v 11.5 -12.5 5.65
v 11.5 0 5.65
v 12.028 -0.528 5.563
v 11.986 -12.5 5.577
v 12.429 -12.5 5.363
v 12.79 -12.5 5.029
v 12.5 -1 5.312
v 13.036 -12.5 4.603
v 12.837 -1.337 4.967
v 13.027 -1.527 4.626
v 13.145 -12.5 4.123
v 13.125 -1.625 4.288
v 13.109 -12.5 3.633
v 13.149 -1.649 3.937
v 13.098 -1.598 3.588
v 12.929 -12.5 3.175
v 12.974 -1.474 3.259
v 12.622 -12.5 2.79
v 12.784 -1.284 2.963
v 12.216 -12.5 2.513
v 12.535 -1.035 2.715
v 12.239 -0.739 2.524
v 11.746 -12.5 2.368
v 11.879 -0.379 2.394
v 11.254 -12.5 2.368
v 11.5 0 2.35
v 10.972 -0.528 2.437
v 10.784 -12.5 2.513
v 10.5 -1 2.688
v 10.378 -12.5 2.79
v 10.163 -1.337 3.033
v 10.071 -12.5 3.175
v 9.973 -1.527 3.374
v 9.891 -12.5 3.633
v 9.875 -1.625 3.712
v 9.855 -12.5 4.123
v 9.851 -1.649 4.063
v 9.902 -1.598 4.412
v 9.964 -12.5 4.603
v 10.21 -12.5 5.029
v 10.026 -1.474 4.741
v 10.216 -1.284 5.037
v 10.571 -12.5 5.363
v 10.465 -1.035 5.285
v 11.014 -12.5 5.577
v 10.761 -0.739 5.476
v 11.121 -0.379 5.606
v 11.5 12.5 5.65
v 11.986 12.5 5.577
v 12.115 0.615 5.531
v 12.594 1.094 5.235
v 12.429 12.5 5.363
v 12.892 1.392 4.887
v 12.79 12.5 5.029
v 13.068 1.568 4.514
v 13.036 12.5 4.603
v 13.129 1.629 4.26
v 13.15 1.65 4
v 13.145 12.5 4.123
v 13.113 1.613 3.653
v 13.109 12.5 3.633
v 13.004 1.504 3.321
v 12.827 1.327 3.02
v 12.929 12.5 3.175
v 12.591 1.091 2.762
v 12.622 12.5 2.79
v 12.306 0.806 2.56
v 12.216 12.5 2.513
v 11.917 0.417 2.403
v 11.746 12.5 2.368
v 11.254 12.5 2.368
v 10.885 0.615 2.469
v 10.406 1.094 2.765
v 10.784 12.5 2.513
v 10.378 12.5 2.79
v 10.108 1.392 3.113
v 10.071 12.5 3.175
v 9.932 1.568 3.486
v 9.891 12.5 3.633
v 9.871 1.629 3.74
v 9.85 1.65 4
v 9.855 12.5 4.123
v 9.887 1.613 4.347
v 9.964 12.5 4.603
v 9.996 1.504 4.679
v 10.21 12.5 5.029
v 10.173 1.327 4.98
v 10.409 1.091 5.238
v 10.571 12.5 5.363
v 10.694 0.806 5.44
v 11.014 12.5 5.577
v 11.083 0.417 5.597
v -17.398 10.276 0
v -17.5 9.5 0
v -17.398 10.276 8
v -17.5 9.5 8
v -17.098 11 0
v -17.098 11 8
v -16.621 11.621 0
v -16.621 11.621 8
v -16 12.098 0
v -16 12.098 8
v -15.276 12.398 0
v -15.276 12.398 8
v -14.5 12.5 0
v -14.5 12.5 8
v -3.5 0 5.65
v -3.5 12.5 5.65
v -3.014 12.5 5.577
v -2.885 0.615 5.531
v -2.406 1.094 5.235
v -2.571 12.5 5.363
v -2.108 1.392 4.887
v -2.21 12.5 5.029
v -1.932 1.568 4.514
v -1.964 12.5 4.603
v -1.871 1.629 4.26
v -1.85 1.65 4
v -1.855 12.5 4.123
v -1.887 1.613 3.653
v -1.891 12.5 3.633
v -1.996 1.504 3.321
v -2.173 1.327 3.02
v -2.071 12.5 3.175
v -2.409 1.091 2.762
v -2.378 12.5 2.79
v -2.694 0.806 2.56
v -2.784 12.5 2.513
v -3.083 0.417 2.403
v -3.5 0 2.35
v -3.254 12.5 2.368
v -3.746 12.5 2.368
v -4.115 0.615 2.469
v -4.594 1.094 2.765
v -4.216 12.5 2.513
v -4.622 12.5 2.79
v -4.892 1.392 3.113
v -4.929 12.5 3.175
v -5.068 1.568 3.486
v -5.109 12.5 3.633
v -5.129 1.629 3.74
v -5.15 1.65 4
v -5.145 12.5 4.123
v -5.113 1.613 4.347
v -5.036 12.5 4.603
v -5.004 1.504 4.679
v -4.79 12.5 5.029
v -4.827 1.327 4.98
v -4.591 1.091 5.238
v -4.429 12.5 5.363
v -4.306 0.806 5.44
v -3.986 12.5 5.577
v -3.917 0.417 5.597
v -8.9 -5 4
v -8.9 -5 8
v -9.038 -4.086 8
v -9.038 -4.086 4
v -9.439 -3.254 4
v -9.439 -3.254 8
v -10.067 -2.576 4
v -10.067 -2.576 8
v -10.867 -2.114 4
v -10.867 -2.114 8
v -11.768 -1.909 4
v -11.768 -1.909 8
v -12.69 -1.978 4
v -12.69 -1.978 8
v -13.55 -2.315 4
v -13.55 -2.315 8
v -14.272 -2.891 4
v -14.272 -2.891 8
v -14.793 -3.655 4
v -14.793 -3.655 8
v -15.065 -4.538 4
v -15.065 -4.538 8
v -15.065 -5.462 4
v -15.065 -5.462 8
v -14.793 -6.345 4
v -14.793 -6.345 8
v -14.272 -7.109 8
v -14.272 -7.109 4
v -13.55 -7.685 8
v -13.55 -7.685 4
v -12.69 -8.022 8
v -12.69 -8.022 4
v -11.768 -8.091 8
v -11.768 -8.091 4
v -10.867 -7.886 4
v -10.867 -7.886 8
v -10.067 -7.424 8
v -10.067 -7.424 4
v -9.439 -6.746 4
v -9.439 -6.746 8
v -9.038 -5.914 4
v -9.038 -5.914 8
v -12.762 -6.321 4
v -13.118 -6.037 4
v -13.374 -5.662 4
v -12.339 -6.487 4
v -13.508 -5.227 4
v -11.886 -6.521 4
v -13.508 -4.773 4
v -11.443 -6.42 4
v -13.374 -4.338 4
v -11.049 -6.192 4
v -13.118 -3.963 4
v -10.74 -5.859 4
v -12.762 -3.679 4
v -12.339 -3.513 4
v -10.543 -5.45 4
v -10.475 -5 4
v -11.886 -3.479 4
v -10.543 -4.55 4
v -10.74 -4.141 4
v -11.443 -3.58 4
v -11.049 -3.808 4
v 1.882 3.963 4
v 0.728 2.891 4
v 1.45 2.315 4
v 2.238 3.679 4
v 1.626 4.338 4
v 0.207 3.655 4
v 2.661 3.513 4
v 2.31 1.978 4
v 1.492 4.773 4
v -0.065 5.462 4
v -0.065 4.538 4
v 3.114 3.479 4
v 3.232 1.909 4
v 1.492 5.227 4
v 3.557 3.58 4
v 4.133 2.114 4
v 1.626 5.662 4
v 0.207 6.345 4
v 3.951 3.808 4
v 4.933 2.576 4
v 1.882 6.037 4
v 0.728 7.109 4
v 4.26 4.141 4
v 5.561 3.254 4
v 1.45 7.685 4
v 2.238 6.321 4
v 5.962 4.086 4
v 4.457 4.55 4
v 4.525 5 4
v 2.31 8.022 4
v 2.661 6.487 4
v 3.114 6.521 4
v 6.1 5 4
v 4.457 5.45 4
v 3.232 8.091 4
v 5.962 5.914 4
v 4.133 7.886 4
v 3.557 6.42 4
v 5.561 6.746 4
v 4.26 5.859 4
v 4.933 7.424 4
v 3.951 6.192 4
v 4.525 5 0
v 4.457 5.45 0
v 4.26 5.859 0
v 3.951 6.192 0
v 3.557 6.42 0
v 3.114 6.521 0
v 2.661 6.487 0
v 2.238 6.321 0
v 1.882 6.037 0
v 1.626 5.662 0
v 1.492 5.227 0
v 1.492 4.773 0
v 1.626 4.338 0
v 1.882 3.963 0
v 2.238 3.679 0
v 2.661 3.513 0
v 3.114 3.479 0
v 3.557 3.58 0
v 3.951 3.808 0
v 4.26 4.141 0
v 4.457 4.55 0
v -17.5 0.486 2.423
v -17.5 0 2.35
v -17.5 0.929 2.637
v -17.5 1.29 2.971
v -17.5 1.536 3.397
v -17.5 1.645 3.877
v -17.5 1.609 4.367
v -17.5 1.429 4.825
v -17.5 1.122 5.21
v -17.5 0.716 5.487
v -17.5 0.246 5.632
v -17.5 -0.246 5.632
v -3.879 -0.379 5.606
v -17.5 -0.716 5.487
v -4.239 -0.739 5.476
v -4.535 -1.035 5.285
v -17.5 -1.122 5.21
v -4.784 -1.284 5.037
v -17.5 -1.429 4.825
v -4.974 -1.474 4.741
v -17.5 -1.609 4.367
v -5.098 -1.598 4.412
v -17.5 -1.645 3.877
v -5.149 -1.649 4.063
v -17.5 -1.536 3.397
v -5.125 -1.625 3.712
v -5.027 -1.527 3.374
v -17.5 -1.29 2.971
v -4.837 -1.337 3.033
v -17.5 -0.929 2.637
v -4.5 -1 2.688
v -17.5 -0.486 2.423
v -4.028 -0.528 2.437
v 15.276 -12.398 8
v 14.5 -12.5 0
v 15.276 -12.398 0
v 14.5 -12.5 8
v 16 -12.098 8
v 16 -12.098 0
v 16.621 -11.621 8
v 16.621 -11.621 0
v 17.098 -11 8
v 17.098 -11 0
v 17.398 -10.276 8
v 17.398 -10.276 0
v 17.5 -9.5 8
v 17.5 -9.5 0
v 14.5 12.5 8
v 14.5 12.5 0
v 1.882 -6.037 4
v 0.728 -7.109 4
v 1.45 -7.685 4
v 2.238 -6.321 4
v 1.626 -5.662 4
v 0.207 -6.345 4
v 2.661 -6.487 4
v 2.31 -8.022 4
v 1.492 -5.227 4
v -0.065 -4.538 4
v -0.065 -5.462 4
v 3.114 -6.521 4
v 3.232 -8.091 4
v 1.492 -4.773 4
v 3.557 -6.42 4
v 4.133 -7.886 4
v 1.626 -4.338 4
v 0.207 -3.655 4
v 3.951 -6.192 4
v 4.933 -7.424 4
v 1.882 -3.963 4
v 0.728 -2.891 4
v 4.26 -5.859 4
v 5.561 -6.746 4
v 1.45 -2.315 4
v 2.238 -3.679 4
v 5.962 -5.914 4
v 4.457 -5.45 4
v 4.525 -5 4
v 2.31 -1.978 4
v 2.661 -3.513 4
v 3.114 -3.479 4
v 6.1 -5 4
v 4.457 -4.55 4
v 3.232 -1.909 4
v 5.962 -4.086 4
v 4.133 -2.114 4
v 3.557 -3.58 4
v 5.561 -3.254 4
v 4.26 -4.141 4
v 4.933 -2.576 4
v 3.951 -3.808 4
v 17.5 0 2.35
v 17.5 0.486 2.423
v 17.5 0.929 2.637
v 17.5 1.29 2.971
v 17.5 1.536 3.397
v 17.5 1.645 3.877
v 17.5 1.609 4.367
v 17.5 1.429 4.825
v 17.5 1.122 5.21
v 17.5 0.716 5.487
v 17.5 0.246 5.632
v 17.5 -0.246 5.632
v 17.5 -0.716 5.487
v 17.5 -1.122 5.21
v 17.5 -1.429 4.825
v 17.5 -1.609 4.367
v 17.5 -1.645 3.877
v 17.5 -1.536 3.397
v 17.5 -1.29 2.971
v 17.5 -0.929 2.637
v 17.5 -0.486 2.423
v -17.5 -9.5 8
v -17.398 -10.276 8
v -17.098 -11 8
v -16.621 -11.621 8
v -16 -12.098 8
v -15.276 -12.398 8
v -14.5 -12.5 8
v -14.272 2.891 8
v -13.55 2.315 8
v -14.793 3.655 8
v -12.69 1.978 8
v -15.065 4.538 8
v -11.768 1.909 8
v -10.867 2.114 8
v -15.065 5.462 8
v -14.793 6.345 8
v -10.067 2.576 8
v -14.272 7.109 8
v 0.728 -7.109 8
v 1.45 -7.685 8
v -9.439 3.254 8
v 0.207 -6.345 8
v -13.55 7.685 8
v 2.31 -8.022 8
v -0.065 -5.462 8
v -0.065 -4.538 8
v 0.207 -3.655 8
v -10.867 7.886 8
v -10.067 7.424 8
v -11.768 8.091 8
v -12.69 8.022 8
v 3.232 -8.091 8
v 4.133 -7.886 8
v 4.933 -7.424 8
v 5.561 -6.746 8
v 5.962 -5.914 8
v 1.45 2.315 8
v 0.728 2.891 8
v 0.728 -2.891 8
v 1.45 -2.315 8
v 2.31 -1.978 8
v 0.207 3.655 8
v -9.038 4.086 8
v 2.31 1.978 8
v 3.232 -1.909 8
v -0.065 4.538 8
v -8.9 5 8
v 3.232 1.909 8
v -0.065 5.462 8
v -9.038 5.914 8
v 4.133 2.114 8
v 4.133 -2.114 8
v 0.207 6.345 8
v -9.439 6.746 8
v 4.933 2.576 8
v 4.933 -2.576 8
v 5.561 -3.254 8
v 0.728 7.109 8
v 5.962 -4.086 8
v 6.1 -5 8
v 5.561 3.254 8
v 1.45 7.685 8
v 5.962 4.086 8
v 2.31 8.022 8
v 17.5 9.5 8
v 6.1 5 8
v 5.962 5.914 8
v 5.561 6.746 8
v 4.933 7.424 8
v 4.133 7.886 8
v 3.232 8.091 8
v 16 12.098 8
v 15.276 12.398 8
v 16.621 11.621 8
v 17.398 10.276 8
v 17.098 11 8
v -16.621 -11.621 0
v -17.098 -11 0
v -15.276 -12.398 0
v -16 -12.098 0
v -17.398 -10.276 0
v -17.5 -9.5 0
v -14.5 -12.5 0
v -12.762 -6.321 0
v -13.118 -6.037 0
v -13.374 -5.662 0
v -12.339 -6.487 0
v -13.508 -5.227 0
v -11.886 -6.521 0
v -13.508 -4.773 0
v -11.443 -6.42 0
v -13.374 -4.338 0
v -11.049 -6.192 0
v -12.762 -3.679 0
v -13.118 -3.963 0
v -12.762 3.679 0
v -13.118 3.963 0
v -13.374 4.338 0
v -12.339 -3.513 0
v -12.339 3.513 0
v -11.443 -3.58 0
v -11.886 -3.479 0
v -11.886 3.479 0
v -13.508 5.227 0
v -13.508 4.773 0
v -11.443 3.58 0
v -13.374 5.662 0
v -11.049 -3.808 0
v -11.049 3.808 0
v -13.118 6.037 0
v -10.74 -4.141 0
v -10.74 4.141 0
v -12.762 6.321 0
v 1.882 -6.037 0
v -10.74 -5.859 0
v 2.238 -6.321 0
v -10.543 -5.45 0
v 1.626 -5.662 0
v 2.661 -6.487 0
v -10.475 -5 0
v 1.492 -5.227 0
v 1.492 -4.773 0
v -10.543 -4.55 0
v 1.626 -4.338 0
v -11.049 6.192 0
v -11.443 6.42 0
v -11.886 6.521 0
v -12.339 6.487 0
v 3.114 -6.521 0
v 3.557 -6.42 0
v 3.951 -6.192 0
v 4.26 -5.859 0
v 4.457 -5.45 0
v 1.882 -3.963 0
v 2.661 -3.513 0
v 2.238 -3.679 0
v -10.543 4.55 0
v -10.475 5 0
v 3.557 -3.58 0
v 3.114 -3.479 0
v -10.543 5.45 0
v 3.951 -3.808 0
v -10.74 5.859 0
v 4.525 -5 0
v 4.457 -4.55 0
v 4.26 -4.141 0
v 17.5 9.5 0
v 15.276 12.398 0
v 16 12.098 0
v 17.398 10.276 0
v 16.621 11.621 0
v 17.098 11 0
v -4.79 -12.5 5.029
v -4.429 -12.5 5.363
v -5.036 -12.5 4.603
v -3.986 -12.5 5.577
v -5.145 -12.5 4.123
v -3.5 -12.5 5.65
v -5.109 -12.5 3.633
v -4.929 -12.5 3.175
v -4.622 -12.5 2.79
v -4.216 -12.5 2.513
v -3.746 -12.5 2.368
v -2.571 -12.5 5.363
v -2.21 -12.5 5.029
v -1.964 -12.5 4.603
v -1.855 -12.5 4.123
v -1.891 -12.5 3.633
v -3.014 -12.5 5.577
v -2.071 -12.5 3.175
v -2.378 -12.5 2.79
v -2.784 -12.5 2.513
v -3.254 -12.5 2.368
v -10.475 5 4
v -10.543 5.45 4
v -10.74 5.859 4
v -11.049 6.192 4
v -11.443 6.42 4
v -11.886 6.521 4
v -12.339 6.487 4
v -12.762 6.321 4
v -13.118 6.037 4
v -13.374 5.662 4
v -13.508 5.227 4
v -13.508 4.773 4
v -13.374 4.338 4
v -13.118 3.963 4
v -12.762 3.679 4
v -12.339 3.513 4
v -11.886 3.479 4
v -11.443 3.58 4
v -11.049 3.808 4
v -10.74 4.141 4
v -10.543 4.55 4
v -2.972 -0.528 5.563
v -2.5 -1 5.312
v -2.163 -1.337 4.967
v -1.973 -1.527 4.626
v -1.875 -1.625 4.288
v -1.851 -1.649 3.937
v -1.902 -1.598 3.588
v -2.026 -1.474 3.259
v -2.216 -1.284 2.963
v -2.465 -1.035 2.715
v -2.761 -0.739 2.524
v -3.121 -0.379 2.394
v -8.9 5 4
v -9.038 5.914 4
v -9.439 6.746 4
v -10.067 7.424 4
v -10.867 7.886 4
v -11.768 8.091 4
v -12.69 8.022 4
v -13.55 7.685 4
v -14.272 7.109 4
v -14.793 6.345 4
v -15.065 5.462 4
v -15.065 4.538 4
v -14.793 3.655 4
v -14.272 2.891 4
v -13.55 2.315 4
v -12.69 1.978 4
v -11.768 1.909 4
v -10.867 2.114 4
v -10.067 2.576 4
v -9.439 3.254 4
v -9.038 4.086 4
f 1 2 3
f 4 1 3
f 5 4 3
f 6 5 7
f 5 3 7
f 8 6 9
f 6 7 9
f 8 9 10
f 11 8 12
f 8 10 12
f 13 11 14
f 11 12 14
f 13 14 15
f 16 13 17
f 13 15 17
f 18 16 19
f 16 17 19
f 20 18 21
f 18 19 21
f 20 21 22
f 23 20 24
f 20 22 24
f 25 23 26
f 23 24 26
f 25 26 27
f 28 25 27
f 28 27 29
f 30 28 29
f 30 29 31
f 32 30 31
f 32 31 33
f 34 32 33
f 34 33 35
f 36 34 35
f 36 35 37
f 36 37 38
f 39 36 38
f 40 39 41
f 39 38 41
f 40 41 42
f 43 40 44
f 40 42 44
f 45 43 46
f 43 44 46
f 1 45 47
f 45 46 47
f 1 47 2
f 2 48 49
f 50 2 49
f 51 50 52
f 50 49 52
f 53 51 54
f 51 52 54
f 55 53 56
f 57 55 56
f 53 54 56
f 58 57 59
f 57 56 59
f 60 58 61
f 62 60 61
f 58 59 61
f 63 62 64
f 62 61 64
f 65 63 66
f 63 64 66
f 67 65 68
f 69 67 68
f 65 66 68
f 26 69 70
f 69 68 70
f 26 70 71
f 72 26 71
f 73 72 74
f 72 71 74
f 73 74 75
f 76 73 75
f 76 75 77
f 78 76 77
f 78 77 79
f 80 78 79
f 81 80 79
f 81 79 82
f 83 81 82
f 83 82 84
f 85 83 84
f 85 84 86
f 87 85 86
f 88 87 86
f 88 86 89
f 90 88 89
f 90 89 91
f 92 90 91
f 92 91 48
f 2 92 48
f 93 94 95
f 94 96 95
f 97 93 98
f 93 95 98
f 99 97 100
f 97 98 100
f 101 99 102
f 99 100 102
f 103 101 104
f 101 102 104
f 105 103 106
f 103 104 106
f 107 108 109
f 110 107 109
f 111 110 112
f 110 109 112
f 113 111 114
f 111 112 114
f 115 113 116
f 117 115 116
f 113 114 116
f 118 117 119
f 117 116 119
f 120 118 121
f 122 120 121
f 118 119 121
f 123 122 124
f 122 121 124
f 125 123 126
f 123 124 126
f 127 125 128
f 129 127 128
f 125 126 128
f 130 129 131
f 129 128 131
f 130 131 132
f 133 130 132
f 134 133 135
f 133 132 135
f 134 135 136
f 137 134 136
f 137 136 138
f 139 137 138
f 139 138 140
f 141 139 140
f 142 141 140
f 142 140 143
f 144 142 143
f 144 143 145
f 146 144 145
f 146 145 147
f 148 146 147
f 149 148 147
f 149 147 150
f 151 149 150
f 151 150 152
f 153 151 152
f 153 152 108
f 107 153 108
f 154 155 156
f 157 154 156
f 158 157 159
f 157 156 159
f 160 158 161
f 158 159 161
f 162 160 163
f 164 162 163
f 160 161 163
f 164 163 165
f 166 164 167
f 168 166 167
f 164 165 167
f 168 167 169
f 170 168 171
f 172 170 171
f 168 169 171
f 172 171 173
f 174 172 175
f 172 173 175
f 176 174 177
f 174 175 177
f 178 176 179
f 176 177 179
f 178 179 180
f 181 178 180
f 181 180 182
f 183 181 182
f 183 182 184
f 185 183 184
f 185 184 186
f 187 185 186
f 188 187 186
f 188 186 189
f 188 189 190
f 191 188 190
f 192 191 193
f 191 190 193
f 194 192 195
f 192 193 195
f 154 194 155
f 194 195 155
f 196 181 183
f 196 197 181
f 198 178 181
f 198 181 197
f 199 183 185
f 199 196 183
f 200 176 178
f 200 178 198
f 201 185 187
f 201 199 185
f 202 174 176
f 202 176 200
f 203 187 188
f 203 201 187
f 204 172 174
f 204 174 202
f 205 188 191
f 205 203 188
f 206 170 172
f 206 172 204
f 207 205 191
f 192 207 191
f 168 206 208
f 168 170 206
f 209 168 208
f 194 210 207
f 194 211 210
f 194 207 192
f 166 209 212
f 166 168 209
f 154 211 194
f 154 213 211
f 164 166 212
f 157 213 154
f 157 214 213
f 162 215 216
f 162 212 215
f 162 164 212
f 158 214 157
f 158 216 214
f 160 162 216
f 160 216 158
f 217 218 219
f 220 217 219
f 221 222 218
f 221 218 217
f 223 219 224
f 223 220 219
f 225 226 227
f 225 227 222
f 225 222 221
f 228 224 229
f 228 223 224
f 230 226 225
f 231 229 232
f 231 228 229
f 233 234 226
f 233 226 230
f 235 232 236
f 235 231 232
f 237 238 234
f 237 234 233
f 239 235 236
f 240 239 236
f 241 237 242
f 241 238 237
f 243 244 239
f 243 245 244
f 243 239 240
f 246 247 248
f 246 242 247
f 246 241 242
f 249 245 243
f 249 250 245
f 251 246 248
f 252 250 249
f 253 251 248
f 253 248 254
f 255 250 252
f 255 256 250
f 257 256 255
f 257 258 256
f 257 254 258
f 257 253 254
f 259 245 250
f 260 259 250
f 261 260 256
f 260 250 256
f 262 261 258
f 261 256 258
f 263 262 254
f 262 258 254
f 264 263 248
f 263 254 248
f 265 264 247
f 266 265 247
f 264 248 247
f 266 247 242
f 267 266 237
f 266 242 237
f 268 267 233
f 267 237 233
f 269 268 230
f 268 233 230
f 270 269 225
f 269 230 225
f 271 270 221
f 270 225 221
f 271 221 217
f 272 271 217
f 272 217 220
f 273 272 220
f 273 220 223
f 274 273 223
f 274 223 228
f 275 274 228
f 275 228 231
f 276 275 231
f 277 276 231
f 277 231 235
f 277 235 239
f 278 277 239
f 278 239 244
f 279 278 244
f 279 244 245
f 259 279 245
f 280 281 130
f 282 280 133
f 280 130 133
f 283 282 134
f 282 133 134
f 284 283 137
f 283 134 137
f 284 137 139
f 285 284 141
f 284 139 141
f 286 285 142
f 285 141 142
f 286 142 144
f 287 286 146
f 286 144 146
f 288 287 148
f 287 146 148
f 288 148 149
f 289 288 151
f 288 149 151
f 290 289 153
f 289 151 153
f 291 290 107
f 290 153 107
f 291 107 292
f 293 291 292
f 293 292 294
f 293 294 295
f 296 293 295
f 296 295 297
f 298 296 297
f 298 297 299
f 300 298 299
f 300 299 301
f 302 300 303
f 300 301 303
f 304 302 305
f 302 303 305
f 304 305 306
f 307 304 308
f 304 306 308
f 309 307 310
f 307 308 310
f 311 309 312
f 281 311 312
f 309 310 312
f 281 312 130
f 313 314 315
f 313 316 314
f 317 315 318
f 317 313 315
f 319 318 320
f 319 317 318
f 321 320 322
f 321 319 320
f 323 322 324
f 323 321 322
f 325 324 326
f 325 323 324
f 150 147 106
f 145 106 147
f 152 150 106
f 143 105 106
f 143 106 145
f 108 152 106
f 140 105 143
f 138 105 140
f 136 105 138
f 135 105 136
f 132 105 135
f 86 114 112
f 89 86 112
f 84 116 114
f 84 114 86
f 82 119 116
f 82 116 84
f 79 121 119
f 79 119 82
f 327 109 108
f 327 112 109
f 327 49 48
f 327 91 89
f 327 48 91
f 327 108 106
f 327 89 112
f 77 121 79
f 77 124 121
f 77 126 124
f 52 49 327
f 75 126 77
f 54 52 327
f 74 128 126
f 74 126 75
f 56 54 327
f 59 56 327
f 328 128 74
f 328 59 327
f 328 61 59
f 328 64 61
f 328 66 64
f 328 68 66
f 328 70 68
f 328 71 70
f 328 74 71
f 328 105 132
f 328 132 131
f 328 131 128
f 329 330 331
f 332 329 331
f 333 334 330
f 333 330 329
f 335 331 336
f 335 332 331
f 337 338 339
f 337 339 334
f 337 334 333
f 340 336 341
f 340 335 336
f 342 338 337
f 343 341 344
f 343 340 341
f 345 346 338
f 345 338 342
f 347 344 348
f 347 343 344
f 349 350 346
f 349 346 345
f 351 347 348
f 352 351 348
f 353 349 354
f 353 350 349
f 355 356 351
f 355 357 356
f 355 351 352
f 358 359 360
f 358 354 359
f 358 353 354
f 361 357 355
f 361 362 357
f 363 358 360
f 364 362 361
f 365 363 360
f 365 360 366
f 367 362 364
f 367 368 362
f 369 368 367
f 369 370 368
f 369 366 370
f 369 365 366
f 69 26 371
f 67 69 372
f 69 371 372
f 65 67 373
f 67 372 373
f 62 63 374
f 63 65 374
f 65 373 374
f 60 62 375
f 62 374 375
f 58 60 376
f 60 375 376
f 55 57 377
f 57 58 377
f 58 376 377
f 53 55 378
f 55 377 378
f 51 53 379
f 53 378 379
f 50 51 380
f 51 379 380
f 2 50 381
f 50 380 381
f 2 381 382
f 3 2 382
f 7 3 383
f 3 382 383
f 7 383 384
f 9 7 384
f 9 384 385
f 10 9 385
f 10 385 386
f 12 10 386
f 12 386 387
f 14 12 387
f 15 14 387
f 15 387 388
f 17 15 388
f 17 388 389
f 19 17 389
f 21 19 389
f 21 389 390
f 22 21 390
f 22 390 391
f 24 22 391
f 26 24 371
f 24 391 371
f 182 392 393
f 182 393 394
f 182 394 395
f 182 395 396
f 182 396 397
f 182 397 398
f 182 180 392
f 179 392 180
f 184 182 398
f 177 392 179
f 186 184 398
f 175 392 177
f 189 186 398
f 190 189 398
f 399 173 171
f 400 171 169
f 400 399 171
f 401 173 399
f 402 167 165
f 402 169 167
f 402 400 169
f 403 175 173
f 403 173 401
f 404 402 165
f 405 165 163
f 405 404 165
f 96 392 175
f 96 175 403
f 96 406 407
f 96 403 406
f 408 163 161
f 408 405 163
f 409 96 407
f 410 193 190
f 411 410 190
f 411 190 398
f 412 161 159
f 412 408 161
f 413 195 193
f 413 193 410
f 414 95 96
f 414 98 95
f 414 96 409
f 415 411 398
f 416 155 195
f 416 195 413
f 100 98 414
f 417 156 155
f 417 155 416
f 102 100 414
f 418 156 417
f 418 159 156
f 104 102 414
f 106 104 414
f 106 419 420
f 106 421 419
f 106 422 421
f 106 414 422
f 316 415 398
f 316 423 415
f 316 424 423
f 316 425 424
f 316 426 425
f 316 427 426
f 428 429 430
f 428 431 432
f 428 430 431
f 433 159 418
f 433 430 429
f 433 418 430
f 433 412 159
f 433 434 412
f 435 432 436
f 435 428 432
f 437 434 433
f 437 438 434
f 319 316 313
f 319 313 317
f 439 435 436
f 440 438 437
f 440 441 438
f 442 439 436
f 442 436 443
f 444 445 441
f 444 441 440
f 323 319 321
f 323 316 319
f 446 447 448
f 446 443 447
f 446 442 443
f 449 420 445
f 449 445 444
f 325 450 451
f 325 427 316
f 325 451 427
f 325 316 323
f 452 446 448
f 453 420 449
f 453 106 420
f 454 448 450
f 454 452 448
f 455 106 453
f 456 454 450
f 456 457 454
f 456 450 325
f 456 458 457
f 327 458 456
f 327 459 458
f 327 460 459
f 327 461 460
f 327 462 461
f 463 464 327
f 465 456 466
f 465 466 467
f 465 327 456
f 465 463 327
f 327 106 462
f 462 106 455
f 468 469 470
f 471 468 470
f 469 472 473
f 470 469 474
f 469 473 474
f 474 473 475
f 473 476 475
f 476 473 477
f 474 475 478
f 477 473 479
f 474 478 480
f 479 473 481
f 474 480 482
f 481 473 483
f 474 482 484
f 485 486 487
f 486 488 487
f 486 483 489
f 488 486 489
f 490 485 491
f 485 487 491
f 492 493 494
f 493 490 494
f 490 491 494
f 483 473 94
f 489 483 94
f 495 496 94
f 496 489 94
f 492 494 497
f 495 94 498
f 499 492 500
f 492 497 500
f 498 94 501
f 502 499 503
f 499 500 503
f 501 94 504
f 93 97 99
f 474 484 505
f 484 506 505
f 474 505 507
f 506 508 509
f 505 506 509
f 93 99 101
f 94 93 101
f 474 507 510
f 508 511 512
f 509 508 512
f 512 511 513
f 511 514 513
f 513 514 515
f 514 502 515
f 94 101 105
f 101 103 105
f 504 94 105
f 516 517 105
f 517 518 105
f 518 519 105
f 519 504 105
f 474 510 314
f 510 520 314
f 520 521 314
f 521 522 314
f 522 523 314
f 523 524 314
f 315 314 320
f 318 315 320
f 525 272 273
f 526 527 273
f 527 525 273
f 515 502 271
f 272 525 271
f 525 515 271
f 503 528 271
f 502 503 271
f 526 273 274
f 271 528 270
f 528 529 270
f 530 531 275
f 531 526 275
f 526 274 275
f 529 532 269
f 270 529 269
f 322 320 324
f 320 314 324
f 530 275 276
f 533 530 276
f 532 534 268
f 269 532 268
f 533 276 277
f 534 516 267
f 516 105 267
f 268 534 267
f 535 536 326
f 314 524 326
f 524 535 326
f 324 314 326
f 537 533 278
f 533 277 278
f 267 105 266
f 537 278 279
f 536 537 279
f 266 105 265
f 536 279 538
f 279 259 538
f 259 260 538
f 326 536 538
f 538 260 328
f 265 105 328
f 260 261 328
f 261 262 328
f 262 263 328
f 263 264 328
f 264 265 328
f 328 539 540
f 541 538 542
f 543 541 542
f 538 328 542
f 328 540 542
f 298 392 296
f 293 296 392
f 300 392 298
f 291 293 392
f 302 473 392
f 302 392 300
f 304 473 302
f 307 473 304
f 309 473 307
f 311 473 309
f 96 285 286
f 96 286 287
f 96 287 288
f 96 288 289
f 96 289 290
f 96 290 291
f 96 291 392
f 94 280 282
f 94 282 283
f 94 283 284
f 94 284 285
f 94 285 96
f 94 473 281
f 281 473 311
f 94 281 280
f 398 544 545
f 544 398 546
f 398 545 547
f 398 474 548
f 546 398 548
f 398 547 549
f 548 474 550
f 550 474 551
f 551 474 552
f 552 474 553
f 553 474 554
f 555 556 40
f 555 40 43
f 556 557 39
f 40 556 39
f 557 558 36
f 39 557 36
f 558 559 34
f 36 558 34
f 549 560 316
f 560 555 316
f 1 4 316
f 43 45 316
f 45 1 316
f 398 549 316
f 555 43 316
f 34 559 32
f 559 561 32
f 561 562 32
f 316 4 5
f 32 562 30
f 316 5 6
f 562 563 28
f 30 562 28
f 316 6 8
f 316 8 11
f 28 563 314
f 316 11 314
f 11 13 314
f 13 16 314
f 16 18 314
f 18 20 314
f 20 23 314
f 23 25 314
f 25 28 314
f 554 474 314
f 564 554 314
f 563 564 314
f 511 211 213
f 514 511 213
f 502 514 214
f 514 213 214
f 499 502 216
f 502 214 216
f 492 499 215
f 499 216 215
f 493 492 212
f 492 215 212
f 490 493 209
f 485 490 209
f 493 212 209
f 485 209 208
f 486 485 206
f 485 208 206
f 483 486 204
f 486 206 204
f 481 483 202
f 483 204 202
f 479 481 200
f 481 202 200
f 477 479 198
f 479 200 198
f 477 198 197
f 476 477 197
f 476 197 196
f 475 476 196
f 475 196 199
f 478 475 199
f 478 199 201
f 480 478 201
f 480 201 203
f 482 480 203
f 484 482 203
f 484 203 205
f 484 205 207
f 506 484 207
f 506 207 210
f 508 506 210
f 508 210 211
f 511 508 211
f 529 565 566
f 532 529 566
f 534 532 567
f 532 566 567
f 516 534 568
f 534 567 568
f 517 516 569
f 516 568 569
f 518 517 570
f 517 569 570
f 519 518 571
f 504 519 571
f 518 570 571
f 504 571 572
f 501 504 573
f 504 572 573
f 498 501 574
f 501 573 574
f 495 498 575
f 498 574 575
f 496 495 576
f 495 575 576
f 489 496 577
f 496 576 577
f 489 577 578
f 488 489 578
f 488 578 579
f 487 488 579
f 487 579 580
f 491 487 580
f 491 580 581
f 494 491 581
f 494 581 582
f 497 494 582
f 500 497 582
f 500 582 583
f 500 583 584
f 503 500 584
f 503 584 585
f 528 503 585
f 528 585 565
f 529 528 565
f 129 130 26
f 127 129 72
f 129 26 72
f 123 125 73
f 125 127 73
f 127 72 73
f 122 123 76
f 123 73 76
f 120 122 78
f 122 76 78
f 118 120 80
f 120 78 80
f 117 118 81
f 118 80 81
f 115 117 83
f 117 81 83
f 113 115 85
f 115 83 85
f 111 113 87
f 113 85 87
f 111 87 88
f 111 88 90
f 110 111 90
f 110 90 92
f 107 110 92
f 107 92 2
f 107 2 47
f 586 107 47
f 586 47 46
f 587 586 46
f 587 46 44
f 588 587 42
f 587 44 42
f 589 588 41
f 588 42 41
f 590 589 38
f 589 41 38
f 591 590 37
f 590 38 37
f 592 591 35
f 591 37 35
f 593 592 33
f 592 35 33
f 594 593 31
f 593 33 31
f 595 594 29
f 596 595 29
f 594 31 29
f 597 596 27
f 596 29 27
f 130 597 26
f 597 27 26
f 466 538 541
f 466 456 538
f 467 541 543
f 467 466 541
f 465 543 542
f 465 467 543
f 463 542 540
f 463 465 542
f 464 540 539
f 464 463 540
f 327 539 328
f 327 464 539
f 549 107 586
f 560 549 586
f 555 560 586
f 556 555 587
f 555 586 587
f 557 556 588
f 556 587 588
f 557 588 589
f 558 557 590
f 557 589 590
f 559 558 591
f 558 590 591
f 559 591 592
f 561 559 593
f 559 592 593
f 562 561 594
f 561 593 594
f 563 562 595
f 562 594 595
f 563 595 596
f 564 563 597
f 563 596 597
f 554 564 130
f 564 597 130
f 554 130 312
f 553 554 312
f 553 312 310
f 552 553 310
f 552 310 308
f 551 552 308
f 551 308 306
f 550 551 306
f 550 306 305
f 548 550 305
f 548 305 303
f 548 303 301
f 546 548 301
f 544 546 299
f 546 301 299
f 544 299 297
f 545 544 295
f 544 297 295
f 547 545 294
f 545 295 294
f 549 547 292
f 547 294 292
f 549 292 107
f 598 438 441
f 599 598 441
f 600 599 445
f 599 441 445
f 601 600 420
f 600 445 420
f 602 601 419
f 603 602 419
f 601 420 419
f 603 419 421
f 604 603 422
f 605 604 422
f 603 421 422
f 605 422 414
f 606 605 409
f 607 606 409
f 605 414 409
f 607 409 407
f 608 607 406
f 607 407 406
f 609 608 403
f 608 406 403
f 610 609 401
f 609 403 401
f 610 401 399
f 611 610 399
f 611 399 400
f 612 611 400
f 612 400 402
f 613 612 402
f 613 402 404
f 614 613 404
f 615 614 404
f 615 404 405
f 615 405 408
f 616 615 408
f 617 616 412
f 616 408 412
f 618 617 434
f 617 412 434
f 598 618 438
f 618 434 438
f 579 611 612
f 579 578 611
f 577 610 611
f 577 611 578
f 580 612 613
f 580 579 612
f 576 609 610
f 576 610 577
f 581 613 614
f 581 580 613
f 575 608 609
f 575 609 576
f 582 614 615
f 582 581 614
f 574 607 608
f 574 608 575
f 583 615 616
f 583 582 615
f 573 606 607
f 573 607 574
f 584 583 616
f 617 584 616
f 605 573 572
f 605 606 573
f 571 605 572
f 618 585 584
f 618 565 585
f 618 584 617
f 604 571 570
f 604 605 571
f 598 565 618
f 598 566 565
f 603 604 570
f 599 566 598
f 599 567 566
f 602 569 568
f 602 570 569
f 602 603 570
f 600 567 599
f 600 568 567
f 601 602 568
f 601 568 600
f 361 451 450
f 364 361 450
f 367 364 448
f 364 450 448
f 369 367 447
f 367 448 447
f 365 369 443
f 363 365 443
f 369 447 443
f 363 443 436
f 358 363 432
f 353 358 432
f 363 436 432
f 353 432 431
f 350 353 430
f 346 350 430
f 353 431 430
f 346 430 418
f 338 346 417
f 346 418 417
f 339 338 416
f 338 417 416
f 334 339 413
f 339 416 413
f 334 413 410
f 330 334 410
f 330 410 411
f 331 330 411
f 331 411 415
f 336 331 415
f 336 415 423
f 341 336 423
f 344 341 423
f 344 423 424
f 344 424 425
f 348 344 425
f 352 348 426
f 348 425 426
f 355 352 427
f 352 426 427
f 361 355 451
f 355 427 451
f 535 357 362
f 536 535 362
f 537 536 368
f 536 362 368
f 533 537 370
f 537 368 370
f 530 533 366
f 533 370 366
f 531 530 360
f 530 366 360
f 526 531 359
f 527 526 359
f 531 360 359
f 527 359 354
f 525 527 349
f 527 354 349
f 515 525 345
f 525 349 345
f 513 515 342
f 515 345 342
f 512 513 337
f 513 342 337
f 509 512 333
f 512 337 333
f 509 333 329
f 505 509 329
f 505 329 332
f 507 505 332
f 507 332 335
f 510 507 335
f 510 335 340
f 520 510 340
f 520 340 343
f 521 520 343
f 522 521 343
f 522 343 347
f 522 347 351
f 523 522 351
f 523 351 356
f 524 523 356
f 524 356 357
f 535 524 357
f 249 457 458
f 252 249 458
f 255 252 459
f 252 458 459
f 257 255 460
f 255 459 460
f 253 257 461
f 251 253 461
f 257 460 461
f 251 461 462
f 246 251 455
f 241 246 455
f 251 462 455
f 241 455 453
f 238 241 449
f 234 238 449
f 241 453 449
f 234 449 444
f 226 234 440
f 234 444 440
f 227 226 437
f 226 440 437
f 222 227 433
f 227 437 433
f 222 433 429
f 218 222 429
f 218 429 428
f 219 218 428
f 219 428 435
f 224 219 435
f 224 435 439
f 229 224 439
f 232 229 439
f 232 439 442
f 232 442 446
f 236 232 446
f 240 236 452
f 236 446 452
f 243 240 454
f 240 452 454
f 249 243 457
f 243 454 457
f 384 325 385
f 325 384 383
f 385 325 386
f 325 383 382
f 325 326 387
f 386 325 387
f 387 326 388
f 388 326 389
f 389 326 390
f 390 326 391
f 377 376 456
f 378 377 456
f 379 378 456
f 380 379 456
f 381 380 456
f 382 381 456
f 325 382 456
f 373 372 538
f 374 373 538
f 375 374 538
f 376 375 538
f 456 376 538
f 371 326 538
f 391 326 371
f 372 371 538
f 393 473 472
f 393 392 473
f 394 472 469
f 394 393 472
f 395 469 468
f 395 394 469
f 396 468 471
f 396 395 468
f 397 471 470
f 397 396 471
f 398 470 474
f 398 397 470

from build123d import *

# Parameters (mm, degrees)
SKETCH_1_W               = 35
SKETCH_1_H               = 25
EXTRUDE_1_DEPTH          = 8
FILLET_1_R               = 3
SKETCH_2_R               = 1.524999998
CUT_EXTRUDE_1_DEPTH      = 1
CUT_EXTRUDE_1_DEPTH_BACK = 9
SKETCH_3_R               = 3.099999998
CUT_EXTRUDE_2_DEPTH      = 4
HOLE_WIZARD_M4_1_D       = 3.3
HOLE_WIZARD_M4_2_D       = 3.3


with BuildPart() as part:
    # 草图1 → 凸台-拉伸1 (new body)
    with BuildSketch(Plane.XY):
        Rectangle(SKETCH_1_W, SKETCH_1_H)
    extrude(amount=EXTRUDE_1_DEPTH)

    # 圆角1
    fillet_1_edges = [part.edges().sort_by_distance(p)[0] for p in [
        (17.5, -12.5, 4),
        (-17.5, -12.5, 4),
        (-17.5, 12.5, 4),
        (17.5, 12.5, 4),
    ]]
    fillet(fillet_1_edges, radius=FILLET_1_R)

    # 草图2 → 切除-拉伸1 (cut, two sides)
    with BuildSketch(Plane.XY.offset(8)) as cut_extrude_1_sk:
        with Locations((3, 5.000000008)):
            Circle(SKETCH_2_R)
        with Locations((3, -4.999999992)):
            Circle(SKETCH_2_R)
        with Locations((-12, 5.000000008)):
            Circle(SKETCH_2_R)
        with Locations((-12, -4.999999992)):
            Circle(SKETCH_2_R)
    extrude(amount=CUT_EXTRUDE_1_DEPTH, mode=Mode.SUBTRACT)
    extrude(cut_extrude_1_sk.sketch, amount=-CUT_EXTRUDE_1_DEPTH_BACK, mode=Mode.SUBTRACT)

    # 草图3 → 切除-拉伸2 (cut)
    with BuildSketch(Plane.XY.offset(8)):
        with Locations((3, 5.000000008)):
            Circle(SKETCH_3_R)
        with Locations((-12, 5.000000008)):
            Circle(SKETCH_3_R)
        with Locations((3, -4.999999992)):
            Circle(SKETCH_3_R)
        with Locations((-12, -4.999999992)):
            Circle(SKETCH_3_R)
    extrude(amount=-CUT_EXTRUDE_2_DEPTH, mode=Mode.SUBTRACT)

    # M4 螺纹孔1 (through all)
    with Locations(Plane(origin=(-3.5, -12.5, 4), x_dir=(0, 0, -1), z_dir=(0, -1, 0))):
        with Locations((0, 0), (0, 15)):
            Hole(HOLE_WIZARD_M4_1_D / 2)

    # M4 螺纹孔2 (through all)
    with Locations(Plane.ZY.offset(17.5)):
        with Locations((4, 9e-09)):
            Hole(HOLE_WIZARD_M4_2_D / 2)


solid = part.part
